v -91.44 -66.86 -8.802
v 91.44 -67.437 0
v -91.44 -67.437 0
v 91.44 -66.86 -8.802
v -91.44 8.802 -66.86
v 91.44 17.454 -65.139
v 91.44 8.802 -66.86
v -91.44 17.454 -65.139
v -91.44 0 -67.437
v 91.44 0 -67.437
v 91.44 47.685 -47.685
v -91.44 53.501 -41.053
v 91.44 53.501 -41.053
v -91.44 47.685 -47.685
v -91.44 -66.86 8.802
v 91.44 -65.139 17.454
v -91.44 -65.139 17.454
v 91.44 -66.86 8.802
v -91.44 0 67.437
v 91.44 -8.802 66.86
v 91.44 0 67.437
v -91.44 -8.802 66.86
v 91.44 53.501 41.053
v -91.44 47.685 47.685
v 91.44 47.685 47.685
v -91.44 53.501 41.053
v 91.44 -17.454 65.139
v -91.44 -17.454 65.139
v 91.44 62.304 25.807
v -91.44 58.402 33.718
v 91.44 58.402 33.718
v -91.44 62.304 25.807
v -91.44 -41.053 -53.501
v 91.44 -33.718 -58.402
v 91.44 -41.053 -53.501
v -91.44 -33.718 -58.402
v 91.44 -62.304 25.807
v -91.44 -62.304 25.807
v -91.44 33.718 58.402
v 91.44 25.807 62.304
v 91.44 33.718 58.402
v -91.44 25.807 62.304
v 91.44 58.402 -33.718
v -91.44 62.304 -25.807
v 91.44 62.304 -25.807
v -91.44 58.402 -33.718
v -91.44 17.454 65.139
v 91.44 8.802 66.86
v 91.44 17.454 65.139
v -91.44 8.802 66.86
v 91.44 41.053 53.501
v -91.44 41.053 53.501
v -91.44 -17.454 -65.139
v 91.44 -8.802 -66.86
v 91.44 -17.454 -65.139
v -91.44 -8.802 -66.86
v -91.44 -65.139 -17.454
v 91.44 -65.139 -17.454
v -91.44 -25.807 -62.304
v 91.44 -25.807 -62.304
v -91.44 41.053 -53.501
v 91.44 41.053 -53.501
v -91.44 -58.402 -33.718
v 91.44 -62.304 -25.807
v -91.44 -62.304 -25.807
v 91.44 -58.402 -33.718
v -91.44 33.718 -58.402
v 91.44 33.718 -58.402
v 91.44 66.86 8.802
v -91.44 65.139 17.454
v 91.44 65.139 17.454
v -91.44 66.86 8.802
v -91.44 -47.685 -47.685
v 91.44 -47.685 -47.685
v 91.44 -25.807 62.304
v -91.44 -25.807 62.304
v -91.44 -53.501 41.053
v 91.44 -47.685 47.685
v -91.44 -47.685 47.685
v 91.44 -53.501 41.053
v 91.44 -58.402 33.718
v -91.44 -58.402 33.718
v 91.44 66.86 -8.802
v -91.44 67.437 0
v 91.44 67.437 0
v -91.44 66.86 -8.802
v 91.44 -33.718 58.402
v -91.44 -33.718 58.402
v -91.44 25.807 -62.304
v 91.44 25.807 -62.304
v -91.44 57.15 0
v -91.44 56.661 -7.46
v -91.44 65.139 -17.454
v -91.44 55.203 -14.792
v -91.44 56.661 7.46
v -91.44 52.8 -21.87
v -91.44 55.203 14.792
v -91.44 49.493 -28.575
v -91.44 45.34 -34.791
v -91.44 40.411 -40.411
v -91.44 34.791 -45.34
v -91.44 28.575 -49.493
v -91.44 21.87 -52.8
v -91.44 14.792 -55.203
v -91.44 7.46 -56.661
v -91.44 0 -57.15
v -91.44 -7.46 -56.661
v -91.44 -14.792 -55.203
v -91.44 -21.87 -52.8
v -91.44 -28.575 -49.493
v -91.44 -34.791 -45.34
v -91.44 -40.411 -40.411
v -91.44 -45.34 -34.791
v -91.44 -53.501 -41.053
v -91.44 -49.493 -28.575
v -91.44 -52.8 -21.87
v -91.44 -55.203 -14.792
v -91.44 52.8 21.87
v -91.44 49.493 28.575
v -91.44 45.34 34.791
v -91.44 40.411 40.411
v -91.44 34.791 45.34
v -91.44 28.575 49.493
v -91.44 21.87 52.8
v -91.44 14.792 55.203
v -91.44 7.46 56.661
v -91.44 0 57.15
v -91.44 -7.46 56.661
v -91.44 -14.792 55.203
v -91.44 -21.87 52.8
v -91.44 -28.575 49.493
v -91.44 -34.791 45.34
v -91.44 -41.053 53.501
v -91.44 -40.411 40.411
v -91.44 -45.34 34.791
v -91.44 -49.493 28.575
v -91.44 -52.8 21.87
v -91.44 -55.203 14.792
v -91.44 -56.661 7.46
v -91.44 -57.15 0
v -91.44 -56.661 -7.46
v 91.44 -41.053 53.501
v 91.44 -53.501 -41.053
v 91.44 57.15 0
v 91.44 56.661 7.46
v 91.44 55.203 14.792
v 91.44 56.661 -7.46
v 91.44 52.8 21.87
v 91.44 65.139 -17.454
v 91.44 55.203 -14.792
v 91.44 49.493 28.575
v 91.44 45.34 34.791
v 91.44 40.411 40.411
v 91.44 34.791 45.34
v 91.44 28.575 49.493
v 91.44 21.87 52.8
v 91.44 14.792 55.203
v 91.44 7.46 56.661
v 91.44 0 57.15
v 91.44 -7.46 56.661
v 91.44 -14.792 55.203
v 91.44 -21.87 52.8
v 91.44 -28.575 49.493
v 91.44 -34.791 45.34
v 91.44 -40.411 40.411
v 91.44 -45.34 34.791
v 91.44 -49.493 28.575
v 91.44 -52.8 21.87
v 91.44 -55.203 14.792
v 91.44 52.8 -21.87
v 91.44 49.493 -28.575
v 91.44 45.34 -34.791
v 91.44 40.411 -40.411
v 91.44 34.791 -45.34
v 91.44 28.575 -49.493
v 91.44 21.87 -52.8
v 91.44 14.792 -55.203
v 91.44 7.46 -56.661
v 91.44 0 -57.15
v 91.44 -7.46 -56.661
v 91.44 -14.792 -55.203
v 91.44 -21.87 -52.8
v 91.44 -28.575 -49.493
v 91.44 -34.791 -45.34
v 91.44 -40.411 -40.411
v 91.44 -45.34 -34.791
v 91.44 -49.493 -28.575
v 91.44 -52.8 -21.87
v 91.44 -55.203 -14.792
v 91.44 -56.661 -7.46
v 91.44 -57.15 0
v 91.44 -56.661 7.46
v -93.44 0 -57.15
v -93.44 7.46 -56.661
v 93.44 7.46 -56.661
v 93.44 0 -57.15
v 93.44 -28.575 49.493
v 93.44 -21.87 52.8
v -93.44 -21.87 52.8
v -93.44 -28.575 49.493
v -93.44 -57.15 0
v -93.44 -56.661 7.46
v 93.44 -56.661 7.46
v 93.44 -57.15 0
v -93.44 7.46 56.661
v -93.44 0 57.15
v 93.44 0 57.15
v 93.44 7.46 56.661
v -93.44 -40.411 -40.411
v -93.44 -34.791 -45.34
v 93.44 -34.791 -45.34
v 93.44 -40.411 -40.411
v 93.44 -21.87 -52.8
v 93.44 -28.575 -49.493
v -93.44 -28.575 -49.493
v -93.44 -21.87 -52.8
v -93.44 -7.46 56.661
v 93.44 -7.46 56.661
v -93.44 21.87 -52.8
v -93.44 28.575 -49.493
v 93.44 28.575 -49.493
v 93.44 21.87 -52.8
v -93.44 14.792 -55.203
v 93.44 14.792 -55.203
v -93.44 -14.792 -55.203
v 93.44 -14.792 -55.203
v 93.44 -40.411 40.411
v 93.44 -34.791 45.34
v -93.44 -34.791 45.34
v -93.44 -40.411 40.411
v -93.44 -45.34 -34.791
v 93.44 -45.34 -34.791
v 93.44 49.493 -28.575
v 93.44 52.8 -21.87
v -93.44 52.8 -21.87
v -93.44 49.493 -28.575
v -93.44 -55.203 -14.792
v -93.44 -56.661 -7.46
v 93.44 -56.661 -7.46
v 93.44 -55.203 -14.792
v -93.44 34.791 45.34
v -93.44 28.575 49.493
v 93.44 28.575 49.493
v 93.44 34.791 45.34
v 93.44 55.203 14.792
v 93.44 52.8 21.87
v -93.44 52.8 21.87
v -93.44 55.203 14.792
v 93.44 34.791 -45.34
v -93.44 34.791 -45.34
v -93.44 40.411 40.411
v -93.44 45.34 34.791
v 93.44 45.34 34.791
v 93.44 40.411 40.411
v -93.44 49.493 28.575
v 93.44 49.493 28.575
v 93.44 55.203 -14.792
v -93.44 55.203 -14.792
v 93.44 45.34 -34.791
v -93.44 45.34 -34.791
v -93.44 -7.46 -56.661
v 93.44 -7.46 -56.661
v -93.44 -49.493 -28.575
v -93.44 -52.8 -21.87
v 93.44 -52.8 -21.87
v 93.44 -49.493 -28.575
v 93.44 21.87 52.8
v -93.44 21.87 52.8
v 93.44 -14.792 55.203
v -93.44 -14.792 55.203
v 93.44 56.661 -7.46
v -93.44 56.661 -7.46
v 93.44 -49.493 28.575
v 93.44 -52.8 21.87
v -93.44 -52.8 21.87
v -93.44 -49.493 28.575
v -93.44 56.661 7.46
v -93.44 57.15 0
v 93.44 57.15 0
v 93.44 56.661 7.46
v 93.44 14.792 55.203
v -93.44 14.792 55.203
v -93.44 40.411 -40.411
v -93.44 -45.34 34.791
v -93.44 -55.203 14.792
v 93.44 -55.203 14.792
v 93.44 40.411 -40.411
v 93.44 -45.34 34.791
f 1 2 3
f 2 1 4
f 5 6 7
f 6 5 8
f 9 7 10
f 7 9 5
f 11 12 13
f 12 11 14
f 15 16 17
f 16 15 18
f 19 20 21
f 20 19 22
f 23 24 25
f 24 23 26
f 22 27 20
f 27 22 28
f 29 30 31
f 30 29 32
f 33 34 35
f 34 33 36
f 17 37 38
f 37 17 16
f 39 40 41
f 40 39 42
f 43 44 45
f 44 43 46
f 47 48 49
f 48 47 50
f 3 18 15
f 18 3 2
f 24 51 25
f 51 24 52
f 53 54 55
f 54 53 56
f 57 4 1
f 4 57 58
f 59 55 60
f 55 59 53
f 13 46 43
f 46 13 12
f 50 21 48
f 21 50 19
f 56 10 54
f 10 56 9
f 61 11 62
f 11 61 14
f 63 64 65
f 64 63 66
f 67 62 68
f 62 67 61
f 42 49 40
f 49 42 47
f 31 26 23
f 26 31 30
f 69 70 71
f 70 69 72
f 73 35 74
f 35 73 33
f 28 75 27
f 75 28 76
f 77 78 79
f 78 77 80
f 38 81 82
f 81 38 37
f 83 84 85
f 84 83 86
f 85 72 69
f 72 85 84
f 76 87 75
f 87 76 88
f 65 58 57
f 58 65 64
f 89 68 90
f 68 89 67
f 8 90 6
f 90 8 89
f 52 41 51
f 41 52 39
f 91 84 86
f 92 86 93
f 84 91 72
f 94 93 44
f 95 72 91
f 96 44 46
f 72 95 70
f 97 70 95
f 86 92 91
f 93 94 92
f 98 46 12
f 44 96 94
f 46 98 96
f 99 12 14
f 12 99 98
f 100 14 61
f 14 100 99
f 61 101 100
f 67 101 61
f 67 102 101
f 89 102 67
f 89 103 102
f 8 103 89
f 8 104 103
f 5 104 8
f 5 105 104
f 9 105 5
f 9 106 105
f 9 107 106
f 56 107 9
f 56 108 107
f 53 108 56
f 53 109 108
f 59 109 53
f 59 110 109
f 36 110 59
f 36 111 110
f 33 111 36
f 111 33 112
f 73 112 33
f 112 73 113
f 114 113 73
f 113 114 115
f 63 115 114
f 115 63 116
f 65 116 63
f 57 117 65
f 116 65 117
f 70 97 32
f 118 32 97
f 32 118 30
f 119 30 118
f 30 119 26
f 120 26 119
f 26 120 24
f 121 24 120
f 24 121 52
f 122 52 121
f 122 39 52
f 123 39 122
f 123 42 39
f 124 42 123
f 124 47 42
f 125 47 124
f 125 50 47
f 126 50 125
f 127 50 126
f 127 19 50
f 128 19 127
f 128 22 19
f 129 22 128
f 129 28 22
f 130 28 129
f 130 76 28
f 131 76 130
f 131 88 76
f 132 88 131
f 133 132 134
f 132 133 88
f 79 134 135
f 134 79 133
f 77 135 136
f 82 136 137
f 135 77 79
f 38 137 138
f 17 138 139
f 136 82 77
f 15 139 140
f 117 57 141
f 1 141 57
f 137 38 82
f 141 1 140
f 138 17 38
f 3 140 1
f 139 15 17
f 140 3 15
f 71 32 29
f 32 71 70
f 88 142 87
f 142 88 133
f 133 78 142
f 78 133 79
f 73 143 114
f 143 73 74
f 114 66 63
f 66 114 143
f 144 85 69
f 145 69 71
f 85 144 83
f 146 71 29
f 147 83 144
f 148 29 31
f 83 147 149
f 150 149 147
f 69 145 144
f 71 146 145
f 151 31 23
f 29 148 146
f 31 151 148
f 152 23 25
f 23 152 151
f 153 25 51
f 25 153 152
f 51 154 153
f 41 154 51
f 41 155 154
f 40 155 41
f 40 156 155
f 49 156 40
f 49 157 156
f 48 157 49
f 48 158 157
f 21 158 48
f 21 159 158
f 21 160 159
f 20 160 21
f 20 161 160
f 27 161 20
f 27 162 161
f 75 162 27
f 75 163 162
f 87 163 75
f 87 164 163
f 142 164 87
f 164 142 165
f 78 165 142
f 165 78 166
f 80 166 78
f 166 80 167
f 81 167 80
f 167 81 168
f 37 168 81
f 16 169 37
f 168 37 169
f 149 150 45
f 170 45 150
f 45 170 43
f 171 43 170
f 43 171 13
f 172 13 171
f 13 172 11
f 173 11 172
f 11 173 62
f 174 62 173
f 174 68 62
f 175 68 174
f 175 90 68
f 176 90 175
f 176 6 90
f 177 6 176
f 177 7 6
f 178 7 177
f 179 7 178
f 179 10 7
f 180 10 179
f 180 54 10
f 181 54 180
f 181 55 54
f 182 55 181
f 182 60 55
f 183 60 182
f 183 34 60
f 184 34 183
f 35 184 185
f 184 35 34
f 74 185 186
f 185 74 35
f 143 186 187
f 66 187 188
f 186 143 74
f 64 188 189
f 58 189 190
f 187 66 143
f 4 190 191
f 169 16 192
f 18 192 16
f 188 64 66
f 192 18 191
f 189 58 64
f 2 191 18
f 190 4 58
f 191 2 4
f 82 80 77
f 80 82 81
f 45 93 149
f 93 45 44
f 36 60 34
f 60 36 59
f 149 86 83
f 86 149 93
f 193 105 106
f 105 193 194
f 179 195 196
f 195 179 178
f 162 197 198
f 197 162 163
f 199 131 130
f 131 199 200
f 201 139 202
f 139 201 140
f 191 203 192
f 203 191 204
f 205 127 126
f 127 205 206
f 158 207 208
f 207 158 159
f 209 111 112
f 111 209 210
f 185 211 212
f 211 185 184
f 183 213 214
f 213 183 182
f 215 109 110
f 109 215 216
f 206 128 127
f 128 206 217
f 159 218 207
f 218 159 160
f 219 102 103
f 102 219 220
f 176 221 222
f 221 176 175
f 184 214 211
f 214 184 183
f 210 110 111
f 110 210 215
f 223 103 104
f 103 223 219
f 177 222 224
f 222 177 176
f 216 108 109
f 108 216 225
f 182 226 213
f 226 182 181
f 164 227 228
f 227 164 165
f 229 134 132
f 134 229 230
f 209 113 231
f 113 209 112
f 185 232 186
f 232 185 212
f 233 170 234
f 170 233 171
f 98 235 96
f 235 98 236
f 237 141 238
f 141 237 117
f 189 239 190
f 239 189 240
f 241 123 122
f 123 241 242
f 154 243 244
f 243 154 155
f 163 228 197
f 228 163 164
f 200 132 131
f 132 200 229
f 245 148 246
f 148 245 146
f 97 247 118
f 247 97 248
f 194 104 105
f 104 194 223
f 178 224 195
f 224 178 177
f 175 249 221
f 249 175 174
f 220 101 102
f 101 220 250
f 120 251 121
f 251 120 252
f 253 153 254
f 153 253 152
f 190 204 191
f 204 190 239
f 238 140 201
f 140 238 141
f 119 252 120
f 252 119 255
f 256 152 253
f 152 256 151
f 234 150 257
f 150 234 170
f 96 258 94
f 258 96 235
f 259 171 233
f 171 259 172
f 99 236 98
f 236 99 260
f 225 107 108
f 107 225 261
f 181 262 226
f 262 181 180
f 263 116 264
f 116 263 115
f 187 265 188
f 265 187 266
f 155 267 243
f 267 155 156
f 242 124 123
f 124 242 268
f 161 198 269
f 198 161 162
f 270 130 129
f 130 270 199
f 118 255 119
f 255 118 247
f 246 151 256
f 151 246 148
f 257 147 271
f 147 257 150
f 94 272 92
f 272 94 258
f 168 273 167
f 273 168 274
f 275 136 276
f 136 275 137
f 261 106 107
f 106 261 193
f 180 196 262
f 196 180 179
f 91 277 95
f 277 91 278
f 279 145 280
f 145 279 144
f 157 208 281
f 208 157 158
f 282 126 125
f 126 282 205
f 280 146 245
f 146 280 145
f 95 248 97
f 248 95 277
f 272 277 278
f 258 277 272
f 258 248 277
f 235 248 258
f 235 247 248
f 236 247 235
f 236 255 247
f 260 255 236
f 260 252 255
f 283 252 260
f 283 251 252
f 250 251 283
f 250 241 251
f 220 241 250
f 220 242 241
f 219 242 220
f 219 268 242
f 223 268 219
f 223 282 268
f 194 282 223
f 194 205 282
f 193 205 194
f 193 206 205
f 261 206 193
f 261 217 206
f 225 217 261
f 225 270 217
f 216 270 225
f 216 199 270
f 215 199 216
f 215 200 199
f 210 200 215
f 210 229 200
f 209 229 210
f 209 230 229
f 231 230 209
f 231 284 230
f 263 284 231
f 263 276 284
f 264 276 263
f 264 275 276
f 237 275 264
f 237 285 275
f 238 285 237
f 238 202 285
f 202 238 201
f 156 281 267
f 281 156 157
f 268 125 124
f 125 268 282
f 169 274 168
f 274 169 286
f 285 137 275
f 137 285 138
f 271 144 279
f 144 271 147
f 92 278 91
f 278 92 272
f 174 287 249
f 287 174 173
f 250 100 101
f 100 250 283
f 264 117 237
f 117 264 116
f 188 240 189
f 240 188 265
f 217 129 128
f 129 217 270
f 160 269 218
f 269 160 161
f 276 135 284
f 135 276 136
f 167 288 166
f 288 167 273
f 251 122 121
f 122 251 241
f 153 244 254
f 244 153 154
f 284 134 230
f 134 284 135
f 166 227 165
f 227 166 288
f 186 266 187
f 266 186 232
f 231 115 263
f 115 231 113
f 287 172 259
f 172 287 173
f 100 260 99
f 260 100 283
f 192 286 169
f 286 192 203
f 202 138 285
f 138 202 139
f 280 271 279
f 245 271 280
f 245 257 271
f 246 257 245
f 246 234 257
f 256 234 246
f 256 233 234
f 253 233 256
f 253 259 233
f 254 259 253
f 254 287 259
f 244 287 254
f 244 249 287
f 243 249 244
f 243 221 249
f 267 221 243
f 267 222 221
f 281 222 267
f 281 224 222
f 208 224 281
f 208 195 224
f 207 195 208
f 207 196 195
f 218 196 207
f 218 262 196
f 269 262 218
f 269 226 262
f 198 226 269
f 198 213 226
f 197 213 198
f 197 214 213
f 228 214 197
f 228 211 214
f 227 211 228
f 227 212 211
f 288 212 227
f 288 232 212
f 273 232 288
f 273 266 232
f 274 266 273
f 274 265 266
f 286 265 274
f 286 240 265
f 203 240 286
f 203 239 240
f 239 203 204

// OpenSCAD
// Auto-generated by scripts/author_from_manifest.py (Phase D.3).
// Source: data/phase_d_manifest.json (sku_intent='victaulic-009-flexible-coupling-4in').
// Do not hand-edit — regenerate from the manifest.
//
// @part victaulic_009_flexible_coupling_4in
// @kind fitting
// @category fitting.coupling
// @display-name "Victaulic FireLock Style 009N Flexible Coupling 4\""
// @mfg victaulic
// @mfg-pn Style_009N_4in
// @listing UL FM
// @price-usd 44.00
// @install-minutes 6
// @crew journeyman
// @param size_in number default=4 label="Size" unit="in"
// @port inlet position=[-0.05,0,0] direction=[-1,0,0] style=grooved size_in=4 role=run_a
// @port outlet position=[0.05,0,0] direction=[1,0,0] style=grooved size_in=4 role=run_b

size_in = 4.0;

function od_mm(nps) =
    nps ==   1  ? 33.4 :
    nps == 1.25 ? 42.2 :
    nps == 1.5  ? 48.3 :
    nps ==   2  ? 60.3 :
    nps == 2.5  ? 73.0 :
    nps ==   3  ? 88.9 :
    nps ==   4  ? 114.3 :
    nps ==   5  ? 141.3 :
    nps ==   6  ? 168.3 :
    nps ==   8  ? 219.1 :
    nps ==  10  ? 273.0 : 60.3;

od = od_mm(size_in);
len_mm = od * 1.6;

rotate([0, 90, 0])
    union() {
        cylinder(h = len_mm, d = od * 1.18, center = true, $fn = 48);
        cylinder(h = len_mm + 4, d = od, center = true, $fn = 48);
    }
